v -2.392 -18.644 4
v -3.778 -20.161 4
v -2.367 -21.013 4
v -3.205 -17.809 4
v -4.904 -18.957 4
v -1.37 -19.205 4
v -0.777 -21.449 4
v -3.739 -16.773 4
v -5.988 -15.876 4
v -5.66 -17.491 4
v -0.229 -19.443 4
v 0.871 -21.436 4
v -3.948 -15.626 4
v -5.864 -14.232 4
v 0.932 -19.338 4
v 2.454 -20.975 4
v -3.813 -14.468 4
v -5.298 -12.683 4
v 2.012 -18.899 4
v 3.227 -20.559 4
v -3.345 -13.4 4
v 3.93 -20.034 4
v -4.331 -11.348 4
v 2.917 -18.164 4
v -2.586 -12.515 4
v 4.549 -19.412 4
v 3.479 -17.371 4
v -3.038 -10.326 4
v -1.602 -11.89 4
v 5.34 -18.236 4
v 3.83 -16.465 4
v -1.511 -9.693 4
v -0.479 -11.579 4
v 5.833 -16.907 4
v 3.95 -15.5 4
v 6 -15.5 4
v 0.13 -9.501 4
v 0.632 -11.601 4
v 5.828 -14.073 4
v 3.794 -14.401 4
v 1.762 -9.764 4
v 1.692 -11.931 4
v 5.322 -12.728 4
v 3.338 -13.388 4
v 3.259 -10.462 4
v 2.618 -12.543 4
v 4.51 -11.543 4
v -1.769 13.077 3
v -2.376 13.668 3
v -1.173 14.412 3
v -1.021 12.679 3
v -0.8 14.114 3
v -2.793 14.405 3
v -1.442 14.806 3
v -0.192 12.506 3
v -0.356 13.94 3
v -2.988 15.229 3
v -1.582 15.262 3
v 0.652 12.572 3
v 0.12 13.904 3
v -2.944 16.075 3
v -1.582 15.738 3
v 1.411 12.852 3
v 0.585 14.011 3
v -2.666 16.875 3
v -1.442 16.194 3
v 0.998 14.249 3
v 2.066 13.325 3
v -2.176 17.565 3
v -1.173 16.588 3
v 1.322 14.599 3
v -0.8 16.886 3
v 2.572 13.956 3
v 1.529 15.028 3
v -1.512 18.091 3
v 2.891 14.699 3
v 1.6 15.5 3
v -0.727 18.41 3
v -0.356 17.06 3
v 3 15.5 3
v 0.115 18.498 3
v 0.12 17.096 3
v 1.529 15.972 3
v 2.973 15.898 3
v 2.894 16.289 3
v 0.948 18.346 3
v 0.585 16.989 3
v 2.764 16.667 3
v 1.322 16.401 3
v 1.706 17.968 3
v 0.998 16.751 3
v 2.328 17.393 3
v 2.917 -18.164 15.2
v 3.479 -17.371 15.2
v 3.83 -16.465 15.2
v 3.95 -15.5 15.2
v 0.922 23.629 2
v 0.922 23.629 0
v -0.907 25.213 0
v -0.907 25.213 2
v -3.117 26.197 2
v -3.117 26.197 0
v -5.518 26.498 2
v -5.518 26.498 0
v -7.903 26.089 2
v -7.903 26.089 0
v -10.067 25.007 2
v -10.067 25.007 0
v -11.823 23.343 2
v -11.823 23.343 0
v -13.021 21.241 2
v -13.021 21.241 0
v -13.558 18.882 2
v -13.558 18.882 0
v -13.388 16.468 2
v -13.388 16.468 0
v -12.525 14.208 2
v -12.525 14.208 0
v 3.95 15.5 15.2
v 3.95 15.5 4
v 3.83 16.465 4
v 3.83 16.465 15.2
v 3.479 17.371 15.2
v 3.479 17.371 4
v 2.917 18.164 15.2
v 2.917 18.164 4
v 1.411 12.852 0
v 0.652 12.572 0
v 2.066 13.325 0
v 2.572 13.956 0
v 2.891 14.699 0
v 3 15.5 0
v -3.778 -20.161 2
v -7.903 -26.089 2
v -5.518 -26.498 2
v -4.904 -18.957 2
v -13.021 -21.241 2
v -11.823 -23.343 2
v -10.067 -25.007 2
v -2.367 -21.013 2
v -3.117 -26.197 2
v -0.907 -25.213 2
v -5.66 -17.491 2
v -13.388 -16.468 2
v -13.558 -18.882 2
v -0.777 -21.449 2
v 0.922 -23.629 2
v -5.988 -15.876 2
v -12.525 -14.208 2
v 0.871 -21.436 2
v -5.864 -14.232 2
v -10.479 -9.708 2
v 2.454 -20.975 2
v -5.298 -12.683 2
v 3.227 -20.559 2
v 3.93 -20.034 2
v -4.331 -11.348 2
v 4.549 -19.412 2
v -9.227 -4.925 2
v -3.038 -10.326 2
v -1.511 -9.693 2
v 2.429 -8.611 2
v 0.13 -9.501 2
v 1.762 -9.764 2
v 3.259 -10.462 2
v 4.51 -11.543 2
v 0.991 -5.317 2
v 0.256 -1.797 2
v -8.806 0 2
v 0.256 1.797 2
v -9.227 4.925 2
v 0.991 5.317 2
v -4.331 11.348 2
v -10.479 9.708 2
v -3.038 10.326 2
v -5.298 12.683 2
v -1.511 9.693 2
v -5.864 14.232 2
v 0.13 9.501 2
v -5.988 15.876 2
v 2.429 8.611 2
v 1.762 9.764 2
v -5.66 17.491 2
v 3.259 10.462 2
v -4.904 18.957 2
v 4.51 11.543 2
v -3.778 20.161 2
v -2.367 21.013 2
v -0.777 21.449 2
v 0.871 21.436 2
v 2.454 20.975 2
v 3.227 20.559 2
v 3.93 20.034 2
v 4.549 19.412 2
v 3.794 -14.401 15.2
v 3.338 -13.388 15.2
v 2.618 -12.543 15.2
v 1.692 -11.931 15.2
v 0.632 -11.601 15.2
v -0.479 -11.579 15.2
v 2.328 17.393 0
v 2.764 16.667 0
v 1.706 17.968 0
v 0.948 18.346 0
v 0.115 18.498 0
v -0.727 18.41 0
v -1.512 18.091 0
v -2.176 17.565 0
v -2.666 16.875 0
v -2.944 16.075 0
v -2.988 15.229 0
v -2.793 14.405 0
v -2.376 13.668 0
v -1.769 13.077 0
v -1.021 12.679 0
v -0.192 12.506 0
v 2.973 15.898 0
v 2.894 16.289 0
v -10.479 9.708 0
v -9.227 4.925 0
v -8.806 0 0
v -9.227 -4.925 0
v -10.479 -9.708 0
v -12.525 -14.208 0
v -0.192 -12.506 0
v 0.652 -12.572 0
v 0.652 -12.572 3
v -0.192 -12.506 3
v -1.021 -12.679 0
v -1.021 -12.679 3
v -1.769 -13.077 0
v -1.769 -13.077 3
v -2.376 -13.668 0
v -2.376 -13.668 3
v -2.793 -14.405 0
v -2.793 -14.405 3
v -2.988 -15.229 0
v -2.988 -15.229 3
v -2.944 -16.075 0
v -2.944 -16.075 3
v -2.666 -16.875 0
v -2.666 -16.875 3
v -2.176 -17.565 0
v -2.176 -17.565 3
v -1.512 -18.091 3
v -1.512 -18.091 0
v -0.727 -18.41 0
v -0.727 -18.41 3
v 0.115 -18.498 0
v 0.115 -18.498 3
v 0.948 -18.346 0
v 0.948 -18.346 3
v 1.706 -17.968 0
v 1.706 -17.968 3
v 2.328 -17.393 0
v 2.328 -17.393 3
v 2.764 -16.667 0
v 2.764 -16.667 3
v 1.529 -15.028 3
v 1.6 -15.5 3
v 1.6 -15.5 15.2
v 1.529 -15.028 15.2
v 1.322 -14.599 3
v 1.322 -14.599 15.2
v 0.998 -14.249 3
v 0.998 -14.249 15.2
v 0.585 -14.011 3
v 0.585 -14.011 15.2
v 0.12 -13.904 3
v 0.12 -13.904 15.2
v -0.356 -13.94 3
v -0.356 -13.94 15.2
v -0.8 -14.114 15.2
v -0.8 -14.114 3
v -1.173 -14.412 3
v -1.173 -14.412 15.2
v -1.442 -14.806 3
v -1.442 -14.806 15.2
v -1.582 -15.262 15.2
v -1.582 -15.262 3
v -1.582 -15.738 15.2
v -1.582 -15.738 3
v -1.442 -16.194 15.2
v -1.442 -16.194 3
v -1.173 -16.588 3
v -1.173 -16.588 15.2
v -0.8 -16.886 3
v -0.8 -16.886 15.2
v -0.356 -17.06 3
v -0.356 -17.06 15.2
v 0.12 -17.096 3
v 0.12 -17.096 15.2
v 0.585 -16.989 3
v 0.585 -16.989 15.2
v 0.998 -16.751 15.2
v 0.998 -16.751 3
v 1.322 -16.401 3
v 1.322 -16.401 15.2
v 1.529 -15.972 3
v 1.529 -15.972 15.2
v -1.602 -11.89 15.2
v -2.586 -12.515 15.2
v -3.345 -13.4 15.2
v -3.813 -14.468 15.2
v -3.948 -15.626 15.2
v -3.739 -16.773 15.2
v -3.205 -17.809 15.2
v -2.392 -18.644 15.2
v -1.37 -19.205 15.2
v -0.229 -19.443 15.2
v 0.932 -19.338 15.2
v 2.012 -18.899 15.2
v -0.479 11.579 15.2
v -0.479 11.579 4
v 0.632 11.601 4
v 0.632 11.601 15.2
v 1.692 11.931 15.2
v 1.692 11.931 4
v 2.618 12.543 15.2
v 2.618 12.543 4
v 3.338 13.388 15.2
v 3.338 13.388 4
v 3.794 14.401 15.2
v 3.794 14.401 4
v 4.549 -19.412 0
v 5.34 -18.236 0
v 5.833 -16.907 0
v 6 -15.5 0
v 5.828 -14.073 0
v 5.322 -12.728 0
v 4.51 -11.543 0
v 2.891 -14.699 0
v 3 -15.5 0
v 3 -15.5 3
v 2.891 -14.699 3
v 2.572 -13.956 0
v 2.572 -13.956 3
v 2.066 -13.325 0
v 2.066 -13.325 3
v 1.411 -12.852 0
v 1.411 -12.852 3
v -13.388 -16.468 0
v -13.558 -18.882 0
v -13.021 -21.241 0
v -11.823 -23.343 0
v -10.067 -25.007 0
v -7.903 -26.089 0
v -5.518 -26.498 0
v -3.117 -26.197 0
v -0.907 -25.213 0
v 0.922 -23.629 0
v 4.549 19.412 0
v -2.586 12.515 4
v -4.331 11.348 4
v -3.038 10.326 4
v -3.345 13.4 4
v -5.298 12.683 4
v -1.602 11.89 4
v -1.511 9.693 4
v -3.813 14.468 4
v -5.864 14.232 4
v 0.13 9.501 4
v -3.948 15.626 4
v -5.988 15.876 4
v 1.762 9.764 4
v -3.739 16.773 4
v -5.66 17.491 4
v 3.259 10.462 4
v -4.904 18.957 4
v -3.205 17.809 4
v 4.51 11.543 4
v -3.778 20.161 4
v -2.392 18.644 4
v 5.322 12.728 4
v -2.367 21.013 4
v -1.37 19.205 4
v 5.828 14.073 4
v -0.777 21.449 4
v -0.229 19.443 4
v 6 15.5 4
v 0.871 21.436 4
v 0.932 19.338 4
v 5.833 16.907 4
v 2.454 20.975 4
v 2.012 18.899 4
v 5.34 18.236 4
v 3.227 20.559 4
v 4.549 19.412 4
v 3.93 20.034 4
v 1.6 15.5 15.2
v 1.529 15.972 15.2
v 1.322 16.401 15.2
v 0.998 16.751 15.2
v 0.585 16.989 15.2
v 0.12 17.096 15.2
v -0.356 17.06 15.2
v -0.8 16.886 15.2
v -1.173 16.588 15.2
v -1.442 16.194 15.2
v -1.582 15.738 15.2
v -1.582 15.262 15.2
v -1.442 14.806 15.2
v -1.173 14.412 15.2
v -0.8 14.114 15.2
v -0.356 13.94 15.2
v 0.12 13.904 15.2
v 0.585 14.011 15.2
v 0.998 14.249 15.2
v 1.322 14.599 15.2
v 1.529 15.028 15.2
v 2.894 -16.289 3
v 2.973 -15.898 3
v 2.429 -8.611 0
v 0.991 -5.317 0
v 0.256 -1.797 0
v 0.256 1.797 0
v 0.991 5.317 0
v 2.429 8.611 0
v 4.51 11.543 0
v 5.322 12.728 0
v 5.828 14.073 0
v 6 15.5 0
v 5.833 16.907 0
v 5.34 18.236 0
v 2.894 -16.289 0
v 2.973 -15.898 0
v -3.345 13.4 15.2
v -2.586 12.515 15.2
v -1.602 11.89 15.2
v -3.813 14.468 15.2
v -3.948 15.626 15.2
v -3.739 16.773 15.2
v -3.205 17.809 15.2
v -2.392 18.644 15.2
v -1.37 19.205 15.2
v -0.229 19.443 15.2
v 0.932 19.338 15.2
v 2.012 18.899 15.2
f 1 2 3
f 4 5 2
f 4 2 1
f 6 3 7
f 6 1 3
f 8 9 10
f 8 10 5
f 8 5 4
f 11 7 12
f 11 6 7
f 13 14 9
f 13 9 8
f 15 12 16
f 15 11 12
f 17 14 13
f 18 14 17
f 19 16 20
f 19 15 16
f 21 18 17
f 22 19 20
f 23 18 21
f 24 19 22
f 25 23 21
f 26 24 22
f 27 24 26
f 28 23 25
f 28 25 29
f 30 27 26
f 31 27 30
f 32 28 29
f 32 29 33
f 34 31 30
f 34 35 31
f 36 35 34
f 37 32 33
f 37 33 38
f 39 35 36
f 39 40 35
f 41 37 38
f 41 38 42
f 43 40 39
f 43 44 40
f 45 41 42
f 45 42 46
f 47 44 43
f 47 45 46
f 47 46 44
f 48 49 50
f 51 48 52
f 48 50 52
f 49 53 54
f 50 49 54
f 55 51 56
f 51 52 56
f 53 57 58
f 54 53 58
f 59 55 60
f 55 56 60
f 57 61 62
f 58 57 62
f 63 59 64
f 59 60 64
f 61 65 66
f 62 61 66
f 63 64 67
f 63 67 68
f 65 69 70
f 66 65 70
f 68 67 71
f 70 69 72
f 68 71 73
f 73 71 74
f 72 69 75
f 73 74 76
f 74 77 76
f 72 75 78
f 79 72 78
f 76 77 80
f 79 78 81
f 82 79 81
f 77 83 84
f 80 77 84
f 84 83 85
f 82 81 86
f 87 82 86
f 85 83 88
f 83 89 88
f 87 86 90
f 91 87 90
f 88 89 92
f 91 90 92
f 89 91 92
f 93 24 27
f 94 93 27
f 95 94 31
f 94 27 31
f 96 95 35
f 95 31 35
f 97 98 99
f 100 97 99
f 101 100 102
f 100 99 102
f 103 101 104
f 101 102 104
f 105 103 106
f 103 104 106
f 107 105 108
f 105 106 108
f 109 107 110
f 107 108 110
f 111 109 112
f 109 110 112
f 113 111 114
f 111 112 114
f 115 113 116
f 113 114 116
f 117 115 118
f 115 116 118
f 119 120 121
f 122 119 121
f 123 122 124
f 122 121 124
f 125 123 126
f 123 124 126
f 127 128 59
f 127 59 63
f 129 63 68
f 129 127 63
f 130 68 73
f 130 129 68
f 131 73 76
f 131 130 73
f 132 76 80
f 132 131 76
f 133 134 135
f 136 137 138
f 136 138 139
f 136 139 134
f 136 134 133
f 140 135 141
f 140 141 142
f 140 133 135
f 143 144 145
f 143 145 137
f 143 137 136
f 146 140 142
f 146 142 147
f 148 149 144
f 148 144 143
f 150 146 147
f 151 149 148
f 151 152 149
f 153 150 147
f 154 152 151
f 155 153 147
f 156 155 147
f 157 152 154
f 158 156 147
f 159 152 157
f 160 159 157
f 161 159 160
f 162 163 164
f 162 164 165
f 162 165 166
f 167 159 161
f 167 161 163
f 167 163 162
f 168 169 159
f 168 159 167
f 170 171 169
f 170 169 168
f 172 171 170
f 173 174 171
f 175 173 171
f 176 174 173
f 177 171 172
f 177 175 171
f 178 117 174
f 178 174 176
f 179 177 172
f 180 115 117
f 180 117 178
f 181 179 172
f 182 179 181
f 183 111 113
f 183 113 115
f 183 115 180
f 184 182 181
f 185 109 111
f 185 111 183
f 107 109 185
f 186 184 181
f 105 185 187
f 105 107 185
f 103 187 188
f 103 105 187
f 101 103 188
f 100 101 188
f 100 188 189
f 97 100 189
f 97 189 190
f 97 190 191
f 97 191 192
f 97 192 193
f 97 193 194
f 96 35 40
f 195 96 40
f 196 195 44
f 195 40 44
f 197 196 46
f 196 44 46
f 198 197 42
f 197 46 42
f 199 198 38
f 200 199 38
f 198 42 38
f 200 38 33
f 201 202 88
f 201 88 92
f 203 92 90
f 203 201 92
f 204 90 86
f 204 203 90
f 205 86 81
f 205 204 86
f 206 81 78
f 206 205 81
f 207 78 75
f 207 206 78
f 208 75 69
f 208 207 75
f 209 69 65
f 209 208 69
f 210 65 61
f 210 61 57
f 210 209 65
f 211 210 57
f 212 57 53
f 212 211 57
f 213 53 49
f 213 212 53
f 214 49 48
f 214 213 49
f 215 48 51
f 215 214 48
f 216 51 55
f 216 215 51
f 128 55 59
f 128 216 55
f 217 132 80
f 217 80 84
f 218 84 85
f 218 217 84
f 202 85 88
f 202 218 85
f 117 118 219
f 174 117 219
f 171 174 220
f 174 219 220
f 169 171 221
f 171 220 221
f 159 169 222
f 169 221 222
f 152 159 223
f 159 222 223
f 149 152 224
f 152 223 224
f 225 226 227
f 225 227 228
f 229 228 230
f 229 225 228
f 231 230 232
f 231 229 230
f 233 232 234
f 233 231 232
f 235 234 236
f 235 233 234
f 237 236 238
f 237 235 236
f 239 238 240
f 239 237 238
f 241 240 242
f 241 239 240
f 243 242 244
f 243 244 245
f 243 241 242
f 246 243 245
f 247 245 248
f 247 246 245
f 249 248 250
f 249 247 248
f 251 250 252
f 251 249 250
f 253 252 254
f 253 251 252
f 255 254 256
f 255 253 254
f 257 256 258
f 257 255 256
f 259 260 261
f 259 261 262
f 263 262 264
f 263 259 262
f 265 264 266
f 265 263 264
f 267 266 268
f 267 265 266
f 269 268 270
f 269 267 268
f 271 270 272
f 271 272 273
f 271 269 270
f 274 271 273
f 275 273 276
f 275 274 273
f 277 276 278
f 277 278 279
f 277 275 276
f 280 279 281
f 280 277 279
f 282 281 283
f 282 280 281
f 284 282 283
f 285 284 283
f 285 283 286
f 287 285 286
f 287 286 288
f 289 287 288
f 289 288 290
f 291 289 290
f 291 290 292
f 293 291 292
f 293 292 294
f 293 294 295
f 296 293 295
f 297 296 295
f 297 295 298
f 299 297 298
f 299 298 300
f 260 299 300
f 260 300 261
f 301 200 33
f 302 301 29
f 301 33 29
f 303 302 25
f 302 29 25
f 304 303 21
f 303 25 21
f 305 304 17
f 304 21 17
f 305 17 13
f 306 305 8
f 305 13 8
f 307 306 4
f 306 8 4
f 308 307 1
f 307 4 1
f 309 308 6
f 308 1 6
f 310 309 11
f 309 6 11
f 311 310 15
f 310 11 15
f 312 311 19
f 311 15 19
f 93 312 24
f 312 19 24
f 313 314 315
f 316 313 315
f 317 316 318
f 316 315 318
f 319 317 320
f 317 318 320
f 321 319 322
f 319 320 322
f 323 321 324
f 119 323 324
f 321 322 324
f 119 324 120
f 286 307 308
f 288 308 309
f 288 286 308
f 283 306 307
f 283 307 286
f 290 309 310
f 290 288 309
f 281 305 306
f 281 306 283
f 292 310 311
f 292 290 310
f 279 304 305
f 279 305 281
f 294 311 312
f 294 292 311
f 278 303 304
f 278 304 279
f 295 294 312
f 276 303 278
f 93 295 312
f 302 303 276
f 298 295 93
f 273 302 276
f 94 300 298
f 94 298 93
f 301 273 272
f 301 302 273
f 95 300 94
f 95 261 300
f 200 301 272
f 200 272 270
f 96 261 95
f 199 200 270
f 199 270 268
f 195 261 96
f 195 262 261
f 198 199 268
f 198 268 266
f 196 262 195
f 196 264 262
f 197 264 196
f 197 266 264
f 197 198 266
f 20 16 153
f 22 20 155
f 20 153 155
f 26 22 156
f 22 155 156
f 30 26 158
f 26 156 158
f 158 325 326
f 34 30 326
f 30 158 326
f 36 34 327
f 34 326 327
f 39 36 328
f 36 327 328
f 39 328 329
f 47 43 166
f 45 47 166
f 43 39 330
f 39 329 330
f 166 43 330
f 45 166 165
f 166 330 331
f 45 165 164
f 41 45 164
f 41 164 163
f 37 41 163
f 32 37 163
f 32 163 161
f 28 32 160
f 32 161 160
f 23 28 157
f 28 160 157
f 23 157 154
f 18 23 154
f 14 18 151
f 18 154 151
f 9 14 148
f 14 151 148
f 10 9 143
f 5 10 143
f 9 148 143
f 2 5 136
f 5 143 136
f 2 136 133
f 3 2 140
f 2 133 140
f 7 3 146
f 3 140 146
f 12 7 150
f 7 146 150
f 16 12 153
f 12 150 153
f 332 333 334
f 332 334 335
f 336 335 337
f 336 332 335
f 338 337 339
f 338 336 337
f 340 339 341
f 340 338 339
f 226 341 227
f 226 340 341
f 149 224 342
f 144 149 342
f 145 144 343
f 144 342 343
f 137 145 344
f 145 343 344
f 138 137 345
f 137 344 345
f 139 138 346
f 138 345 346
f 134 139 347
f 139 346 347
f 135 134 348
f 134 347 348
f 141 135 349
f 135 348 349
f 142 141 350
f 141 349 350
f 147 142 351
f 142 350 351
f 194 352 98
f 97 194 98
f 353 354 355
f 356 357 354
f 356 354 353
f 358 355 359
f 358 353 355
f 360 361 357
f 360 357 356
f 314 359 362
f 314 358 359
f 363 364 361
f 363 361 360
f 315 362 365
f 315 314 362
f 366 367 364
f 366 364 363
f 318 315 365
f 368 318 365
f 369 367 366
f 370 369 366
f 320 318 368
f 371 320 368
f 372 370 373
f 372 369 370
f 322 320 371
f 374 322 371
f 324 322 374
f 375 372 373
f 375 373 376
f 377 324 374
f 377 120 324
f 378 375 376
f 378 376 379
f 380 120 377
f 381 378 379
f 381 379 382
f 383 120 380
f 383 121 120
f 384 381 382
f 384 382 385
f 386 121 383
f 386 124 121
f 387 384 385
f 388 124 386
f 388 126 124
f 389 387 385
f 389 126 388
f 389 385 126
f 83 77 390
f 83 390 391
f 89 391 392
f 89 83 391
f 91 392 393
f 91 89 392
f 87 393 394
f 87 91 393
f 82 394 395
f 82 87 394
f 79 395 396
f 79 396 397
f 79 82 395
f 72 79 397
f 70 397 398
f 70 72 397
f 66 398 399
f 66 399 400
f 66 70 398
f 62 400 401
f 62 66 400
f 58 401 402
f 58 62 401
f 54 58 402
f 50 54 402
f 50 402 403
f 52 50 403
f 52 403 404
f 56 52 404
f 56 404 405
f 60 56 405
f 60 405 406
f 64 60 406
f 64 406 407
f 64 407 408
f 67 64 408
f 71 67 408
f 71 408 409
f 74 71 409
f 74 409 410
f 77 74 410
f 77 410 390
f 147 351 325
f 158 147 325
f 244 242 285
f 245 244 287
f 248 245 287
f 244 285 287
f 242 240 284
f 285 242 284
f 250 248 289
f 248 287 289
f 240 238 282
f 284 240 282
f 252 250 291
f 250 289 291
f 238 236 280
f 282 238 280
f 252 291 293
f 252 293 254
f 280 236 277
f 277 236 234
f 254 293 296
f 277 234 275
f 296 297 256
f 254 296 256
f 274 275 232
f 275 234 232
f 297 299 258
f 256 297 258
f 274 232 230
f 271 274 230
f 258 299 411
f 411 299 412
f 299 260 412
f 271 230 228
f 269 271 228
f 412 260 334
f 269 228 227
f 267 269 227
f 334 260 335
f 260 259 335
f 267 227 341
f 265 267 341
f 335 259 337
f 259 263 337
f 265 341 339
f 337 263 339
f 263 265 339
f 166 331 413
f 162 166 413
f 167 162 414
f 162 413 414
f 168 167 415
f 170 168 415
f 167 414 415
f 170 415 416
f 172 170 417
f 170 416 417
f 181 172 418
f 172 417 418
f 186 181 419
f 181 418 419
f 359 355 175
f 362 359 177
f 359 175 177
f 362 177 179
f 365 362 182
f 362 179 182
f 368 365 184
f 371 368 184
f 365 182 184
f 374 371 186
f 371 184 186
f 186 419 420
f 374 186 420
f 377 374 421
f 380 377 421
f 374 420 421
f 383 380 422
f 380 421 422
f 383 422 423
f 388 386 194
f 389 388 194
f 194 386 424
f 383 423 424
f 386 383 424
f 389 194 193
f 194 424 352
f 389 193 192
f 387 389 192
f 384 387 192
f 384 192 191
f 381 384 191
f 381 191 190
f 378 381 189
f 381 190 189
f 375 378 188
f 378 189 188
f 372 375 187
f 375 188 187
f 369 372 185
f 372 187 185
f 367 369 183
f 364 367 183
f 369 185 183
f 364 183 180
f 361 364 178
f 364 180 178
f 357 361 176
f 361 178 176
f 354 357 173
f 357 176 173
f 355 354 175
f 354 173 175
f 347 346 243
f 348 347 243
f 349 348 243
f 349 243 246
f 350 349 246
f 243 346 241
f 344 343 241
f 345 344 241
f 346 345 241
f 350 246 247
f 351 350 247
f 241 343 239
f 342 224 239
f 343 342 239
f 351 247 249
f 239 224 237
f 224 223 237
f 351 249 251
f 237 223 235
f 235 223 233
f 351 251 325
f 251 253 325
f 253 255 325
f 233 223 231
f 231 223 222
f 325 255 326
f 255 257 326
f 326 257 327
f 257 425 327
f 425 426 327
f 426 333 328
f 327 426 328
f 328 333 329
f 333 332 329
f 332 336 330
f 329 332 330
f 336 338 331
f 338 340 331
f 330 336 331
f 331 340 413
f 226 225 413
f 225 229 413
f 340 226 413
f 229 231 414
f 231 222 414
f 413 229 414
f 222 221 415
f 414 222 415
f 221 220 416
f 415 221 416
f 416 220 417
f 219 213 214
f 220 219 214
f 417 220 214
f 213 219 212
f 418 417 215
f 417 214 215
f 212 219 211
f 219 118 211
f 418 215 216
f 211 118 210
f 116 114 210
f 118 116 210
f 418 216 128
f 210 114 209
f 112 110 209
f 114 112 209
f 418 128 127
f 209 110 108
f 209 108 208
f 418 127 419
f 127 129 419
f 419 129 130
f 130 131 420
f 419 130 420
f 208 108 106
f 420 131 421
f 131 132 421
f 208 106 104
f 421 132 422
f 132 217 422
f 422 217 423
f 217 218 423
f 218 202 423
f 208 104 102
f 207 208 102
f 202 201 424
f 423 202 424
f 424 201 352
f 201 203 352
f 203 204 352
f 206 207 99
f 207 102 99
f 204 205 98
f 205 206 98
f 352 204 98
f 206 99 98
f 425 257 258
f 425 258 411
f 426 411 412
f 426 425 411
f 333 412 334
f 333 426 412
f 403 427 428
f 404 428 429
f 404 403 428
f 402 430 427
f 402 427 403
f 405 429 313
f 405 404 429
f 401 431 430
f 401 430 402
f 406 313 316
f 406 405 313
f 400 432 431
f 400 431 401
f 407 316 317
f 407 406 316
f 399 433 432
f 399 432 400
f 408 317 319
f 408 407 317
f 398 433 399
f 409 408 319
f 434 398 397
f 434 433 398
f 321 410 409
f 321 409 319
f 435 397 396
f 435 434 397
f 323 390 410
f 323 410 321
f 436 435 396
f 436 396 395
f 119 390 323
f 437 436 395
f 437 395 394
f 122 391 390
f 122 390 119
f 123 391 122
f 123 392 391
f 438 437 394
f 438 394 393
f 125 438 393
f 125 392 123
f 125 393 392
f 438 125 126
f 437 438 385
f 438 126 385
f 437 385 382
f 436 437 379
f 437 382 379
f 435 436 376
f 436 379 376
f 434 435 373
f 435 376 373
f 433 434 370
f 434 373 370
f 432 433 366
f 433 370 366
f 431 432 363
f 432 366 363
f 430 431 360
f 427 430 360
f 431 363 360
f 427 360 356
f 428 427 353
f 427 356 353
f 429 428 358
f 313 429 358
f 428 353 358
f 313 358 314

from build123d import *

# Parameters (mm, degrees)
F0_R     = 1.6
F1_DEPTH = 2
F2_DEPTH = 4
F3_DEPTH = 15.2
F4_DEPTH = 15.2
F5_DEPTH = 3


with BuildPart() as f1:
    # F0 (on Top) → F1 (new body)
    with BuildSketch(Plane.XY):
        with BuildLine():
            ThreePointArc((4.509835336, 11.5425531915), (0.9550503073, 9.5764977496), (-3.0375157377, 10.325688631))
            ThreePointArc((-3.0375157377, 10.325688631), (-8.4572600243, 10.6145881745), (-12.5247035281, 14.2080536913))
            ThreePointArc((-12.5247035281, 14.2080536913), (-8.8057480142, 0), (-12.5247035281, -14.2080536913))
            ThreePointArc((-12.5247035281, -14.2080536913), (-8.4572600243, -10.6145881745), (-3.0375157377, -10.325688631))
            ThreePointArc((-3.0375157377, -10.325688631), (0.9550503073, -9.5764977496), (4.509835336, -11.5425531915))
            ThreePointArc((4.509835336, -11.5425531915), (0.1635217327, 0), (4.509835336, 11.5425531915))
        make_face()
        with BuildLine():
            ThreePointArc((-3.0375157377, -10.325688631), (-8.4572600243, -10.6145881745), (-12.5247035281, -14.2080536913))
            ThreePointArc((-12.5247035281, -14.2080536913), (-10.0665892972, -25.0066725603), (0.9222946004, -23.6293832897))
            ThreePointArc((0.9222946004, -23.6293832897), (1.8126059127, -22.3739977019), (2.4542536164, -20.975092619))
            ThreePointArc((2.4542536164, -20.975092619), (-5.3326822519, -18.25), (-3.0375157377, -10.325688631))
        make_face()
        with BuildLine():
            ThreePointArc((6, -15.5), (5.615114069, -13.3856457269), (4.509835336, -11.5425531915))
            ThreePointArc((4.509835336, -11.5425531915), (0.9550503073, -9.5764977496), (-3.0375157377, -10.325688631))
            ThreePointArc((-3.0375157377, -10.325688631), (-1.7035573479, -10.8410896597), (-0.4786437682, -11.5791072263))
            ThreePointArc((-0.4786437682, -11.5791072263), (2.6183828134, -12.5425396973), (3.95, -15.5))
            ThreePointArc((3.95, -15.5), (3.6826698984, -16.928440555), (2.9168645978, -18.1635316626))
            ThreePointArc((2.9168645978, -18.1635316626), (2.9172044597, -18.2067652376), (2.9173177481, -18.25))
            ThreePointArc((2.9173177481, -18.25), (2.8007278851, -19.6320779801), (2.4542536164, -20.975092619))
            ThreePointArc((2.4542536164, -20.975092619), (3.5877913093, -20.3091323044), (4.5490740744, -19.4122787561))
            ThreePointArc((4.5490740744, -19.4122787561), (5.6255863893, -17.5863311762), (6, -15.5))
        make_face()
        with BuildLine():
            ThreePointArc((-0.4786437682, 11.5791072263), (-3.5106824825, 17.3104166667), (2.9168645978, 18.1635316626))
            ThreePointArc((2.9168645978, 18.1635316626), (2.9172044597, 18.2067652376), (2.9173177481, 18.25))
            ThreePointArc((2.9173177481, 18.25), (2.8007278851, 19.6320779801), (2.4542536164, 20.975092619))
            ThreePointArc((2.4542536164, 20.975092619), (-5.3326822519, 18.25), (-3.0375157377, 10.325688631))
            ThreePointArc((-3.0375157377, 10.325688631), (-1.7035573479, 10.8410896597), (-0.4786437682, 11.5791072263))
        make_face()
        with BuildLine():
            ThreePointArc((-0.4786437682, -11.5791072263), (-1.7035573479, -10.8410896597), (-3.0375157377, -10.325688631))
            ThreePointArc((-3.0375157377, -10.325688631), (-5.3326822519, -18.25), (2.4542536164, -20.975092619))
            ThreePointArc((2.4542536164, -20.975092619), (2.8007278851, -19.6320779801), (2.9173177481, -18.25))
            ThreePointArc((2.9173177481, -18.25), (2.9172044597, -18.2067652376), (2.9168645978, -18.1635316626))
            ThreePointArc((2.9168645978, -18.1635316626), (-3.5106824825, -17.3104166667), (-0.4786437682, -11.5791072263))
        make_face()
        with BuildLine():
            ThreePointArc((-12.5247035281, 14.2080536913), (-8.4572600243, 10.6145881745), (-3.0375157377, 10.325688631))
            ThreePointArc((-3.0375157377, 10.325688631), (-5.3326822519, 18.25), (2.4542536164, 20.975092619))
            ThreePointArc((2.4542536164, 20.975092619), (1.8126059127, 22.3739977019), (0.9222946004, 23.6293832897))
            ThreePointArc((0.9222946004, 23.6293832897), (-10.0665892972, 25.0066725603), (-12.5247035281, 14.2080536913))
        make_face()
        with BuildLine():
            ThreePointArc((2.9168645978, 18.1635316626), (3.6826698984, 16.928440555), (3.95, 15.5))
            ThreePointArc((3.95, 15.5), (2.6183828134, 12.5425396973), (-0.4786437682, 11.5791072263))
            ThreePointArc((-0.4786437682, 11.5791072263), (-1.7035573479, 10.8410896597), (-3.0375157377, 10.325688631))
            ThreePointArc((-3.0375157377, 10.325688631), (0.9550503073, 9.5764977496), (4.509835336, 11.5425531915))
            ThreePointArc((4.509835336, 11.5425531915), (5.615114069, 13.3856457269), (6, 15.5))
            ThreePointArc((6, 15.5), (5.6255863893, 17.5863311762), (4.5490740744, 19.4122787561))
            ThreePointArc((4.5490740744, 19.4122787561), (3.5877913093, 20.3091323044), (2.4542536164, 20.975092619))
            ThreePointArc((2.4542536164, 20.975092619), (2.8007278851, 19.6320779801), (2.9173177481, 18.25))
            ThreePointArc((2.9173177481, 18.25), (2.9172044597, 18.2067652376), (2.9168645978, 18.1635316626))
        make_face()
        with BuildLine():
            ThreePointArc((0.6523256734, 12.5717801968), (1.9997558445, 14.46875), (2.7639238942, 16.6665010532))
            ThreePointArc((2.7639238942, 16.6665010532), (-2.666341126, 16.875), (0.6523256734, 12.5717801968))
        make_face()
        with Locations((0, 15.5)):
            Circle(F0_R, mode=Mode.SUBTRACT)
        with BuildLine():
            ThreePointArc((2.7639238942, -16.6665010532), (1.9997558445, -14.46875), (0.6523256734, -12.5717801968))
            ThreePointArc((0.6523256734, -12.5717801968), (-2.666341126, -16.875), (2.7639238942, -16.6665010532))
        make_face()
        with Locations((0, -15.5)):
            Circle(F0_R, mode=Mode.SUBTRACT)
        with Locations((0, -15.5)):
            Circle(F0_R)
        with Locations((0, 15.5)):
            Circle(F0_R)
        with BuildLine():
            ThreePointArc((3.95, -15.5), (2.6183828134, -12.5425396973), (-0.4786437682, -11.5791072263))
            ThreePointArc((-0.4786437682, -11.5791072263), (0.1095214994, -12.0496033733), (0.6523256734, -12.5717801968))
            ThreePointArc((0.6523256734, -12.5717801968), (2.3406171217, -13.6234309259), (3, -15.5))
            ThreePointArc((3, -15.5), (2.9403887228, -16.0950749186), (2.7639238942, -16.6665010532))
            ThreePointArc((2.7639238942, -16.6665010532), (2.8745983332, -17.4115219757), (2.9168645978, -18.1635316626))
            ThreePointArc((2.9168645978, -18.1635316626), (3.6826698984, -16.928440555), (3.95, -15.5))
        make_face()
        with BuildLine():
            ThreePointArc((2.7639238942, 16.6665010532), (2.8745983332, 17.4115219757), (2.9168645978, 18.1635316626))
            ThreePointArc((2.9168645978, 18.1635316626), (-3.5106824825, 17.3104166667), (-0.4786437682, 11.5791072263))
            ThreePointArc((-0.4786437682, 11.5791072263), (0.1095214994, 12.0496033733), (0.6523256734, 12.5717801968))
            ThreePointArc((0.6523256734, 12.5717801968), (-2.666341126, 16.875), (2.7639238942, 16.6665010532))
        make_face()
        with BuildLine():
            ThreePointArc((0.9222946004, 23.6293832897), (1.8126059127, 22.3739977019), (2.4542536164, 20.975092619))
            ThreePointArc((2.4542536164, 20.975092619), (3.5877913093, 20.3091323044), (4.5490740744, 19.4122787561))
            Line((4.5490740744, 19.4122787561), (0.9222946004, 23.6293832897))
        make_face()
        with BuildLine():
            ThreePointArc((2.4542536164, -20.975092619), (1.8126059127, -22.3739977019), (0.9222946004, -23.6293832897))
            Line((0.9222946004, -23.6293832897), (4.5490740744, -19.4122787561))
            ThreePointArc((4.5490740744, -19.4122787561), (3.5877913093, -20.3091323044), (2.4542536164, -20.975092619))
        make_face()
        with BuildLine():
            ThreePointArc((-0.4786437682, 11.5791072263), (2.6183828134, 12.5425396973), (3.95, 15.5))
            ThreePointArc((3.95, 15.5), (3.6826698984, 16.928440555), (2.9168645978, 18.1635316626))
            ThreePointArc((2.9168645978, 18.1635316626), (2.8745983332, 17.4115219757), (2.7639238942, 16.6665010532))
            ThreePointArc((2.7639238942, 16.6665010532), (2.9403887228, 16.0950749186), (3, 15.5))
            ThreePointArc((3, 15.5), (2.3406171217, 13.6234309259), (0.6523256734, 12.5717801968))
            ThreePointArc((0.6523256734, 12.5717801968), (0.1095214994, 12.0496033733), (-0.4786437682, 11.5791072263))
        make_face()
        with BuildLine():
            ThreePointArc((3, 15.5), (2.9403887228, 16.0950749186), (2.7639238942, 16.6665010532))
            ThreePointArc((2.7639238942, 16.6665010532), (1.9997558445, 14.46875), (0.6523256734, 12.5717801968))
            ThreePointArc((0.6523256734, 12.5717801968), (2.3406171217, 13.6234309259), (3, 15.5))
        make_face()
        with BuildLine():
            ThreePointArc((0.6523256734, -12.5717801968), (0.1095214994, -12.0496033733), (-0.4786437682, -11.5791072263))
            ThreePointArc((-0.4786437682, -11.5791072263), (-3.5106824825, -17.3104166667), (2.9168645978, -18.1635316626))
            ThreePointArc((2.9168645978, -18.1635316626), (2.8745983332, -17.4115219757), (2.7639238942, -16.6665010532))
            ThreePointArc((2.7639238942, -16.6665010532), (-2.666341126, -16.875), (0.6523256734, -12.5717801968))
        make_face()
        with BuildLine():
            ThreePointArc((3, -15.5), (2.3406171217, -13.6234309259), (0.6523256734, -12.5717801968))
            ThreePointArc((0.6523256734, -12.5717801968), (1.9997558445, -14.46875), (2.7639238942, -16.6665010532))
            ThreePointArc((2.7639238942, -16.6665010532), (2.9403887228, -16.0950749186), (3, -15.5))
        make_face()
    extrude(amount=F1_DEPTH)

    # F0 (on Top) → F2 (join)
    with BuildSketch(Plane.XY):
        with BuildLine():
            ThreePointArc((-0.4786437682, -11.5791072263), (-1.7035573479, -10.8410896597), (-3.0375157377, -10.325688631))
            ThreePointArc((-3.0375157377, -10.325688631), (-5.3326822519, -18.25), (2.4542536164, -20.975092619))
            ThreePointArc((2.4542536164, -20.975092619), (2.8007278851, -19.6320779801), (2.9173177481, -18.25))
            ThreePointArc((2.9173177481, -18.25), (2.9172044597, -18.2067652376), (2.9168645978, -18.1635316626))
            ThreePointArc((2.9168645978, -18.1635316626), (-3.5106824825, -17.3104166667), (-0.4786437682, -11.5791072263))
        make_face()
        with BuildLine():
            ThreePointArc((6, -15.5), (5.615114069, -13.3856457269), (4.509835336, -11.5425531915))
            ThreePointArc((4.509835336, -11.5425531915), (0.9550503073, -9.5764977496), (-3.0375157377, -10.325688631))
            ThreePointArc((-3.0375157377, -10.325688631), (-1.7035573479, -10.8410896597), (-0.4786437682, -11.5791072263))
            ThreePointArc((-0.4786437682, -11.5791072263), (2.6183828134, -12.5425396973), (3.95, -15.5))
            ThreePointArc((3.95, -15.5), (3.6826698984, -16.928440555), (2.9168645978, -18.1635316626))
            ThreePointArc((2.9168645978, -18.1635316626), (2.9172044597, -18.2067652376), (2.9173177481, -18.25))
            ThreePointArc((2.9173177481, -18.25), (2.8007278851, -19.6320779801), (2.4542536164, -20.975092619))
            ThreePointArc((2.4542536164, -20.975092619), (3.5877913093, -20.3091323044), (4.5490740744, -19.4122787561))
            ThreePointArc((4.5490740744, -19.4122787561), (5.6255863893, -17.5863311762), (6, -15.5))
        make_face()
        with BuildLine():
            ThreePointArc((-0.4786437682, 11.5791072263), (-3.5106824825, 17.3104166667), (2.9168645978, 18.1635316626))
            ThreePointArc((2.9168645978, 18.1635316626), (2.9172044597, 18.2067652376), (2.9173177481, 18.25))
            ThreePointArc((2.9173177481, 18.25), (2.8007278851, 19.6320779801), (2.4542536164, 20.975092619))
            ThreePointArc((2.4542536164, 20.975092619), (-5.3326822519, 18.25), (-3.0375157377, 10.325688631))
            ThreePointArc((-3.0375157377, 10.325688631), (-1.7035573479, 10.8410896597), (-0.4786437682, 11.5791072263))
        make_face()
        with BuildLine():
            ThreePointArc((2.9168645978, 18.1635316626), (3.6826698984, 16.928440555), (3.95, 15.5))
            ThreePointArc((3.95, 15.5), (2.6183828134, 12.5425396973), (-0.4786437682, 11.5791072263))
            ThreePointArc((-0.4786437682, 11.5791072263), (-1.7035573479, 10.8410896597), (-3.0375157377, 10.325688631))
            ThreePointArc((-3.0375157377, 10.325688631), (0.9550503073, 9.5764977496), (4.509835336, 11.5425531915))
            ThreePointArc((4.509835336, 11.5425531915), (5.615114069, 13.3856457269), (6, 15.5))
            ThreePointArc((6, 15.5), (5.6255863893, 17.5863311762), (4.5490740744, 19.4122787561))
            ThreePointArc((4.5490740744, 19.4122787561), (3.5877913093, 20.3091323044), (2.4542536164, 20.975092619))
            ThreePointArc((2.4542536164, 20.975092619), (2.8007278851, 19.6320779801), (2.9173177481, 18.25))
            ThreePointArc((2.9173177481, 18.25), (2.9172044597, 18.2067652376), (2.9168645978, 18.1635316626))
        make_face()
        with BuildLine():
            ThreePointArc((0.6523256734, 12.5717801968), (1.9997558445, 14.46875), (2.7639238942, 16.6665010532))
            ThreePointArc((2.7639238942, 16.6665010532), (-2.666341126, 16.875), (0.6523256734, 12.5717801968))
        make_face()
        with Locations((0, 15.5)):
            Circle(F0_R, mode=Mode.SUBTRACT)
        with BuildLine():
            ThreePointArc((2.7639238942, -16.6665010532), (1.9997558445, -14.46875), (0.6523256734, -12.5717801968))
            ThreePointArc((0.6523256734, -12.5717801968), (-2.666341126, -16.875), (2.7639238942, -16.6665010532))
        make_face()
        with Locations((0, -15.5)):
            Circle(F0_R, mode=Mode.SUBTRACT)
        with Locations((0, -15.5)):
            Circle(F0_R)
        with Locations((0, 15.5)):
            Circle(F0_R)
        with BuildLine():
            ThreePointArc((2.7639238942, 16.6665010532), (2.8745983332, 17.4115219757), (2.9168645978, 18.1635316626))
            ThreePointArc((2.9168645978, 18.1635316626), (-3.5106824825, 17.3104166667), (-0.4786437682, 11.5791072263))
            ThreePointArc((-0.4786437682, 11.5791072263), (0.1095214994, 12.0496033733), (0.6523256734, 12.5717801968))
            ThreePointArc((0.6523256734, 12.5717801968), (-2.666341126, 16.875), (2.7639238942, 16.6665010532))
        make_face()
        with BuildLine():
            ThreePointArc((3.95, -15.5), (2.6183828134, -12.5425396973), (-0.4786437682, -11.5791072263))
            ThreePointArc((-0.4786437682, -11.5791072263), (0.1095214994, -12.0496033733), (0.6523256734, -12.5717801968))
            ThreePointArc((0.6523256734, -12.5717801968), (2.3406171217, -13.6234309259), (3, -15.5))
            ThreePointArc((3, -15.5), (2.9403887228, -16.0950749186), (2.7639238942, -16.6665010532))
            ThreePointArc((2.7639238942, -16.6665010532), (2.8745983332, -17.4115219757), (2.9168645978, -18.1635316626))
            ThreePointArc((2.9168645978, -18.1635316626), (3.6826698984, -16.928440555), (3.95, -15.5))
        make_face()
        with BuildLine():
            ThreePointArc((-0.4786437682, 11.5791072263), (2.6183828134, 12.5425396973), (3.95, 15.5))
            ThreePointArc((3.95, 15.5), (3.6826698984, 16.928440555), (2.9168645978, 18.1635316626))
            ThreePointArc((2.9168645978, 18.1635316626), (2.8745983332, 17.4115219757), (2.7639238942, 16.6665010532))
            ThreePointArc((2.7639238942, 16.6665010532), (2.9403887228, 16.0950749186), (3, 15.5))
            ThreePointArc((3, 15.5), (2.3406171217, 13.6234309259), (0.6523256734, 12.5717801968))
            ThreePointArc((0.6523256734, 12.5717801968), (0.1095214994, 12.0496033733), (-0.4786437682, 11.5791072263))
        make_face()
        with BuildLine():
            ThreePointArc((3, 15.5), (2.9403887228, 16.0950749186), (2.7639238942, 16.6665010532))
            ThreePointArc((2.7639238942, 16.6665010532), (1.9997558445, 14.46875), (0.6523256734, 12.5717801968))
            ThreePointArc((0.6523256734, 12.5717801968), (2.3406171217, 13.6234309259), (3, 15.5))
        make_face()
        with BuildLine():
            ThreePointArc((3, -15.5), (2.3406171217, -13.6234309259), (0.6523256734, -12.5717801968))
            ThreePointArc((0.6523256734, -12.5717801968), (1.9997558445, -14.46875), (2.7639238942, -16.6665010532))
            ThreePointArc((2.7639238942, -16.6665010532), (2.9403887228, -16.0950749186), (3, -15.5))
        make_face()
        with BuildLine():
            ThreePointArc((0.6523256734, -12.5717801968), (0.1095214994, -12.0496033733), (-0.4786437682, -11.5791072263))
            ThreePointArc((-0.4786437682, -11.5791072263), (-3.5106824825, -17.3104166667), (2.9168645978, -18.1635316626))
            ThreePointArc((2.9168645978, -18.1635316626), (2.8745983332, -17.4115219757), (2.7639238942, -16.6665010532))
            ThreePointArc((2.7639238942, -16.6665010532), (-2.666341126, -16.875), (0.6523256734, -12.5717801968))
        make_face()
    extrude(amount=F2_DEPTH)

    # F0 (on Top) → F3 (join)
    with BuildSketch(Plane.XY):
        with BuildLine():
            ThreePointArc((3.95, -15.5), (2.6183828134, -12.5425396973), (-0.4786437682, -11.5791072263))
            ThreePointArc((-0.4786437682, -11.5791072263), (0.1095214994, -12.0496033733), (0.6523256734, -12.5717801968))
            ThreePointArc((0.6523256734, -12.5717801968), (2.3406171217, -13.6234309259), (3, -15.5))
            ThreePointArc((3, -15.5), (2.9403887228, -16.0950749186), (2.7639238942, -16.6665010532))
            ThreePointArc((2.7639238942, -16.6665010532), (2.8745983332, -17.4115219757), (2.9168645978, -18.1635316626))
            ThreePointArc((2.9168645978, -18.1635316626), (3.6826698984, -16.928440555), (3.95, -15.5))
        make_face()
        with BuildLine():
            ThreePointArc((2.7639238942, -16.6665010532), (1.9997558445, -14.46875), (0.6523256734, -12.5717801968))
            ThreePointArc((0.6523256734, -12.5717801968), (-2.666341126, -16.875), (2.7639238942, -16.6665010532))
        make_face()
        with Locations((0, -15.5)):
            Circle(F0_R, mode=Mode.SUBTRACT)
        with Locations((0, -15.5)):
            Circle(F0_R)
        with BuildLine():
            ThreePointArc((0.6523256734, 12.5717801968), (1.9997558445, 14.46875), (2.7639238942, 16.6665010532))
            ThreePointArc((2.7639238942, 16.6665010532), (-2.666341126, 16.875), (0.6523256734, 12.5717801968))
        make_face()
        with Locations((0, 15.5)):
            Circle(F0_R, mode=Mode.SUBTRACT)
        with Locations((0, 15.5)):
            Circle(F0_R)
        with BuildLine():
            ThreePointArc((-0.4786437682, 11.5791072263), (2.6183828134, 12.5425396973), (3.95, 15.5))
            ThreePointArc((3.95, 15.5), (3.6826698984, 16.928440555), (2.9168645978, 18.1635316626))
            ThreePointArc((2.9168645978, 18.1635316626), (2.8745983332, 17.4115219757), (2.7639238942, 16.6665010532))
            ThreePointArc((2.7639238942, 16.6665010532), (2.9403887228, 16.0950749186), (3, 15.5))
            ThreePointArc((3, 15.5), (2.3406171217, 13.6234309259), (0.6523256734, 12.5717801968))
            ThreePointArc((0.6523256734, 12.5717801968), (0.1095214994, 12.0496033733), (-0.4786437682, 11.5791072263))
        make_face()
        with BuildLine():
            ThreePointArc((2.7639238942, 16.6665010532), (2.8745983332, 17.4115219757), (2.9168645978, 18.1635316626))
            ThreePointArc((2.9168645978, 18.1635316626), (-3.5106824825, 17.3104166667), (-0.4786437682, 11.5791072263))
            ThreePointArc((-0.4786437682, 11.5791072263), (0.1095214994, 12.0496033733), (0.6523256734, 12.5717801968))
            ThreePointArc((0.6523256734, 12.5717801968), (-2.666341126, 16.875), (2.7639238942, 16.6665010532))
        make_face()
        with BuildLine():
            ThreePointArc((3, 15.5), (2.9403887228, 16.0950749186), (2.7639238942, 16.6665010532))
            ThreePointArc((2.7639238942, 16.6665010532), (1.9997558445, 14.46875), (0.6523256734, 12.5717801968))
            ThreePointArc((0.6523256734, 12.5717801968), (2.3406171217, 13.6234309259), (3, 15.5))
        make_face()
        with BuildLine():
            ThreePointArc((0.6523256734, -12.5717801968), (0.1095214994, -12.0496033733), (-0.4786437682, -11.5791072263))
            ThreePointArc((-0.4786437682, -11.5791072263), (-3.5106824825, -17.3104166667), (2.9168645978, -18.1635316626))
            ThreePointArc((2.9168645978, -18.1635316626), (2.8745983332, -17.4115219757), (2.7639238942, -16.6665010532))
            ThreePointArc((2.7639238942, -16.6665010532), (-2.666341126, -16.875), (0.6523256734, -12.5717801968))
        make_face()
        with BuildLine():
            ThreePointArc((3, -15.5), (2.3406171217, -13.6234309259), (0.6523256734, -12.5717801968))
            ThreePointArc((0.6523256734, -12.5717801968), (1.9997558445, -14.46875), (2.7639238942, -16.6665010532))
            ThreePointArc((2.7639238942, -16.6665010532), (2.9403887228, -16.0950749186), (3, -15.5))
        make_face()
    extrude(amount=F3_DEPTH)

    # F0 (on Top) → F4 (cut, through all)
    with BuildSketch(Plane.XY):
        with Locations((0, -15.5)):
            Circle(F0_R)
        with Locations((0, 15.5)):
            Circle(F0_R)
    extrude(amount=F4_DEPTH, mode=Mode.SUBTRACT)

    # F0 (on Top) → F5 (cut)
    with BuildSketch(Plane.XY):
        with BuildLine():
            ThreePointArc((0.6523256734, 12.5717801968), (1.9997558445, 14.46875), (2.7639238942, 16.6665010532))
            ThreePointArc((2.7639238942, 16.6665010532), (-2.666341126, 16.875), (0.6523256734, 12.5717801968))
        make_face()
        with Locations((0, 15.5)):
            Circle(F0_R, mode=Mode.SUBTRACT)
        with BuildLine():
            ThreePointArc((3, 15.5), (2.9403887228, 16.0950749186), (2.7639238942, 16.6665010532))
            ThreePointArc((2.7639238942, 16.6665010532), (1.9997558445, 14.46875), (0.6523256734, 12.5717801968))
            ThreePointArc((0.6523256734, 12.5717801968), (2.3406171217, 13.6234309259), (3, 15.5))
        make_face()
        with BuildLine():
            ThreePointArc((2.7639238942, -16.6665010532), (1.9997558445, -14.46875), (0.6523256734, -12.5717801968))
            ThreePointArc((0.6523256734, -12.5717801968), (-2.666341126, -16.875), (2.7639238942, -16.6665010532))
        make_face()
        with Locations((0, -15.5)):
            Circle(F0_R, mode=Mode.SUBTRACT)
        with BuildLine():
            ThreePointArc((3, -15.5), (2.3406171217, -13.6234309259), (0.6523256734, -12.5717801968))
            ThreePointArc((0.6523256734, -12.5717801968), (1.9997558445, -14.46875), (2.7639238942, -16.6665010532))
            ThreePointArc((2.7639238942, -16.6665010532), (2.9403887228, -16.0950749186), (3, -15.5))
        make_face()
        with Locations((0, -15.5)):
            Circle(F0_R)
        with Locations((0, 15.5)):
            Circle(F0_R)
    extrude(amount=F5_DEPTH, mode=Mode.SUBTRACT)


solid = f1.part
